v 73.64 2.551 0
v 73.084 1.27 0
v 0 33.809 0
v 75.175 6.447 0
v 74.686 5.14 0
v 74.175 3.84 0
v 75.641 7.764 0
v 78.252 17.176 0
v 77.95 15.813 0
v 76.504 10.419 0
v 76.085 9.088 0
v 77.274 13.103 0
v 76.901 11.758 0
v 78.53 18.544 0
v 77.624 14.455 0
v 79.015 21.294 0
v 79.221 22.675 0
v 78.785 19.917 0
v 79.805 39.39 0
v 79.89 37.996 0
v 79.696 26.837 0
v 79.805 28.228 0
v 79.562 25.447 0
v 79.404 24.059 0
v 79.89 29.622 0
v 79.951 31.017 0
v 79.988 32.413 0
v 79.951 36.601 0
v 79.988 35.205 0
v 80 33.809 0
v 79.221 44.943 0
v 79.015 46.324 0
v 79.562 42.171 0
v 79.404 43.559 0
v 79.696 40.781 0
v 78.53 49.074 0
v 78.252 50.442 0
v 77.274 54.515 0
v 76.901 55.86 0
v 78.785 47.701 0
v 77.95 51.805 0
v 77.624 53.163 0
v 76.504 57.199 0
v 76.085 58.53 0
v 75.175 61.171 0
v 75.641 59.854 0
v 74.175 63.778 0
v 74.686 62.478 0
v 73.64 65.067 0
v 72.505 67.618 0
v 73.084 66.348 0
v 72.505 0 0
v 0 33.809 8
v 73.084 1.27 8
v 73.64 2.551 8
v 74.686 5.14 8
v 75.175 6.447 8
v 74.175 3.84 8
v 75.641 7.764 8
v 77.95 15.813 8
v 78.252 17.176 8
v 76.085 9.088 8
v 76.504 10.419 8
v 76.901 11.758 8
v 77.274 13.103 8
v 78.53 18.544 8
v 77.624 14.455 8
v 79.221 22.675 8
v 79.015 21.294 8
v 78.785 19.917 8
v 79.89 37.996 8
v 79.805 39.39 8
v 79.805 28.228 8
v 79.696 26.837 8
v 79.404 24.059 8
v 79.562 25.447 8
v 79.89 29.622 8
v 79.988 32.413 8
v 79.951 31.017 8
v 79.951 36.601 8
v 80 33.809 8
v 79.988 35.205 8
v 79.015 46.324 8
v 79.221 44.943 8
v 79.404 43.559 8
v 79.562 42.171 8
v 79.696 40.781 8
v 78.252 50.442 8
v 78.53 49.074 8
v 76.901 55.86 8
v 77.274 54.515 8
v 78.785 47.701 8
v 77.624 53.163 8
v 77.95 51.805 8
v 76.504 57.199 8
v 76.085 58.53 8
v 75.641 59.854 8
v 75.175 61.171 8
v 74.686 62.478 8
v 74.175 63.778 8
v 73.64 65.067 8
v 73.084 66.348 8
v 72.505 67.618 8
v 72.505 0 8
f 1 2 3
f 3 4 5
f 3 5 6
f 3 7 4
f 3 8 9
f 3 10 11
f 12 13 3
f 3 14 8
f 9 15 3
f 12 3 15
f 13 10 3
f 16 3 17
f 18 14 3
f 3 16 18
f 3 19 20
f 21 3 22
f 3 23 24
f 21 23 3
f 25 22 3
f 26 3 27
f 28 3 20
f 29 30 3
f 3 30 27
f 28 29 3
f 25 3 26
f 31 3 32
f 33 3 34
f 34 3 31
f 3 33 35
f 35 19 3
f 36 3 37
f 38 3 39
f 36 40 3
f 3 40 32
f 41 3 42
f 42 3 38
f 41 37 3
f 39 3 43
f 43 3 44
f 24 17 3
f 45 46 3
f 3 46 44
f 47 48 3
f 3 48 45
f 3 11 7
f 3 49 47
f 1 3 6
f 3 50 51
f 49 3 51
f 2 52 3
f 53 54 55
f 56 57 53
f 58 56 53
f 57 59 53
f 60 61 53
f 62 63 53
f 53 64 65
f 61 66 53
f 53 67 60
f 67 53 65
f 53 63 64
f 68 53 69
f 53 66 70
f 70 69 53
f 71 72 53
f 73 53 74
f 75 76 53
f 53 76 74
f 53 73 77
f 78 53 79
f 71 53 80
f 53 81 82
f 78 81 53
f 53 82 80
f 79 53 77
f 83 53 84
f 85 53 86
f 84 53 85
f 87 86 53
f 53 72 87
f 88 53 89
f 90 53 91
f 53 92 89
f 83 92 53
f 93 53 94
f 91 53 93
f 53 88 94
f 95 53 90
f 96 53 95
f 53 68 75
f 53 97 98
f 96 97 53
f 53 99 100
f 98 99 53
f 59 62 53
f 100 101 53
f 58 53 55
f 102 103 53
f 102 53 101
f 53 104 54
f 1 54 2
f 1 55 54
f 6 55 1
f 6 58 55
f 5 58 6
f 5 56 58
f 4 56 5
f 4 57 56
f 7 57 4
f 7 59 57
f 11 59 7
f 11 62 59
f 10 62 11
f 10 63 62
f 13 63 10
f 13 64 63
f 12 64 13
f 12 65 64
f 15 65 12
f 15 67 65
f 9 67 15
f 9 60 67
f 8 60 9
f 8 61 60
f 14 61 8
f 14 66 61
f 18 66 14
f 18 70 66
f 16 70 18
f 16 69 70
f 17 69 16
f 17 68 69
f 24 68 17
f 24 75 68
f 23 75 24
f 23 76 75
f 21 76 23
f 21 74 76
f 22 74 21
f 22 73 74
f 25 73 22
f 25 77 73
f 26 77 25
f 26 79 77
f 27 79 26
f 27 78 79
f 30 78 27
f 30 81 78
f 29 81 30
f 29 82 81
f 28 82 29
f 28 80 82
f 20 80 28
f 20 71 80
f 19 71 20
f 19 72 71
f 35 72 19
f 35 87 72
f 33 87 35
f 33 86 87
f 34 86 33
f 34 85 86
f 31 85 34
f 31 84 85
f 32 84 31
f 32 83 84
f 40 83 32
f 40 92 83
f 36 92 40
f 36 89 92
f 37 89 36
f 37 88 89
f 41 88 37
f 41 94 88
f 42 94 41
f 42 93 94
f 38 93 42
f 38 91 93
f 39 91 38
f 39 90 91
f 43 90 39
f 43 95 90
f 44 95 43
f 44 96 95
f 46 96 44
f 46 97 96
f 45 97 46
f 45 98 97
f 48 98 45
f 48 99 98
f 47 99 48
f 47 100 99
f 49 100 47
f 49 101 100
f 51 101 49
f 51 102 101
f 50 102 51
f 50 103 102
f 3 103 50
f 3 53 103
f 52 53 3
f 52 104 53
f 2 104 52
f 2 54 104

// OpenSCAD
$fn = 32;

// ----------------------------------------------------------------------
// Arc profile plate: sector, 52 points
// ----------------------------------------------------------------------

// --- parameters (mm) ---
sector_angle = 50;        // sector angle, degrees
sector_r = 80;            // outer radius
arc_step = 1;             // sampling step of the arc, degrees
plate_t = 8;              // plate thickness, Z
fit_tol = 0.05;           // declared fit tolerance (prompt contract)
free_tol = 0.3;           // declared free tolerance (prompt contract)

bbox_x = 2 * sector_r * sin(sector_angle / 2);  // chord of the sector
bbox_y = sector_r;  // depth of the sector (apex to arc)

profile = [[72.505, 0], [73.084, 1.27], [73.64, 2.551], [74.175, 3.84], [74.686, 5.14], [75.175, 6.447], [75.641, 7.764], [76.085, 9.088], [76.504, 10.419], [76.901, 11.758], [77.274, 13.103], [77.624, 14.455], [77.95, 15.813], [78.252, 17.176], [78.53, 18.544], [78.785, 19.917], [79.015, 21.294], [79.221, 22.675], [79.404, 24.059], [79.562, 25.447], [79.696, 26.837], [79.805, 28.228], [79.89, 29.622], [79.951, 31.017], [79.988, 32.413], [80, 33.809], [79.988, 35.205], [79.951, 36.601], [79.89, 37.996], [79.805, 39.39], [79.696, 40.781], [79.562, 42.171], [79.404, 43.559], [79.221, 44.943], [79.015, 46.324], [78.785, 47.701], [78.53, 49.074], [78.252, 50.442], [77.95, 51.805], [77.624, 53.163], [77.274, 54.515], [76.901, 55.86], [76.504, 57.199], [76.085, 58.53], [75.641, 59.854], [75.175, 61.171], [74.686, 62.478], [74.175, 63.778], [73.64, 65.067], [73.084, 66.348], [72.505, 67.618], [0, 33.809]];  // primary outline, 52 points, counter clockwise

// --- the one profile operation ---
linear_extrude(height = plate_t) polygon(points = profile);
